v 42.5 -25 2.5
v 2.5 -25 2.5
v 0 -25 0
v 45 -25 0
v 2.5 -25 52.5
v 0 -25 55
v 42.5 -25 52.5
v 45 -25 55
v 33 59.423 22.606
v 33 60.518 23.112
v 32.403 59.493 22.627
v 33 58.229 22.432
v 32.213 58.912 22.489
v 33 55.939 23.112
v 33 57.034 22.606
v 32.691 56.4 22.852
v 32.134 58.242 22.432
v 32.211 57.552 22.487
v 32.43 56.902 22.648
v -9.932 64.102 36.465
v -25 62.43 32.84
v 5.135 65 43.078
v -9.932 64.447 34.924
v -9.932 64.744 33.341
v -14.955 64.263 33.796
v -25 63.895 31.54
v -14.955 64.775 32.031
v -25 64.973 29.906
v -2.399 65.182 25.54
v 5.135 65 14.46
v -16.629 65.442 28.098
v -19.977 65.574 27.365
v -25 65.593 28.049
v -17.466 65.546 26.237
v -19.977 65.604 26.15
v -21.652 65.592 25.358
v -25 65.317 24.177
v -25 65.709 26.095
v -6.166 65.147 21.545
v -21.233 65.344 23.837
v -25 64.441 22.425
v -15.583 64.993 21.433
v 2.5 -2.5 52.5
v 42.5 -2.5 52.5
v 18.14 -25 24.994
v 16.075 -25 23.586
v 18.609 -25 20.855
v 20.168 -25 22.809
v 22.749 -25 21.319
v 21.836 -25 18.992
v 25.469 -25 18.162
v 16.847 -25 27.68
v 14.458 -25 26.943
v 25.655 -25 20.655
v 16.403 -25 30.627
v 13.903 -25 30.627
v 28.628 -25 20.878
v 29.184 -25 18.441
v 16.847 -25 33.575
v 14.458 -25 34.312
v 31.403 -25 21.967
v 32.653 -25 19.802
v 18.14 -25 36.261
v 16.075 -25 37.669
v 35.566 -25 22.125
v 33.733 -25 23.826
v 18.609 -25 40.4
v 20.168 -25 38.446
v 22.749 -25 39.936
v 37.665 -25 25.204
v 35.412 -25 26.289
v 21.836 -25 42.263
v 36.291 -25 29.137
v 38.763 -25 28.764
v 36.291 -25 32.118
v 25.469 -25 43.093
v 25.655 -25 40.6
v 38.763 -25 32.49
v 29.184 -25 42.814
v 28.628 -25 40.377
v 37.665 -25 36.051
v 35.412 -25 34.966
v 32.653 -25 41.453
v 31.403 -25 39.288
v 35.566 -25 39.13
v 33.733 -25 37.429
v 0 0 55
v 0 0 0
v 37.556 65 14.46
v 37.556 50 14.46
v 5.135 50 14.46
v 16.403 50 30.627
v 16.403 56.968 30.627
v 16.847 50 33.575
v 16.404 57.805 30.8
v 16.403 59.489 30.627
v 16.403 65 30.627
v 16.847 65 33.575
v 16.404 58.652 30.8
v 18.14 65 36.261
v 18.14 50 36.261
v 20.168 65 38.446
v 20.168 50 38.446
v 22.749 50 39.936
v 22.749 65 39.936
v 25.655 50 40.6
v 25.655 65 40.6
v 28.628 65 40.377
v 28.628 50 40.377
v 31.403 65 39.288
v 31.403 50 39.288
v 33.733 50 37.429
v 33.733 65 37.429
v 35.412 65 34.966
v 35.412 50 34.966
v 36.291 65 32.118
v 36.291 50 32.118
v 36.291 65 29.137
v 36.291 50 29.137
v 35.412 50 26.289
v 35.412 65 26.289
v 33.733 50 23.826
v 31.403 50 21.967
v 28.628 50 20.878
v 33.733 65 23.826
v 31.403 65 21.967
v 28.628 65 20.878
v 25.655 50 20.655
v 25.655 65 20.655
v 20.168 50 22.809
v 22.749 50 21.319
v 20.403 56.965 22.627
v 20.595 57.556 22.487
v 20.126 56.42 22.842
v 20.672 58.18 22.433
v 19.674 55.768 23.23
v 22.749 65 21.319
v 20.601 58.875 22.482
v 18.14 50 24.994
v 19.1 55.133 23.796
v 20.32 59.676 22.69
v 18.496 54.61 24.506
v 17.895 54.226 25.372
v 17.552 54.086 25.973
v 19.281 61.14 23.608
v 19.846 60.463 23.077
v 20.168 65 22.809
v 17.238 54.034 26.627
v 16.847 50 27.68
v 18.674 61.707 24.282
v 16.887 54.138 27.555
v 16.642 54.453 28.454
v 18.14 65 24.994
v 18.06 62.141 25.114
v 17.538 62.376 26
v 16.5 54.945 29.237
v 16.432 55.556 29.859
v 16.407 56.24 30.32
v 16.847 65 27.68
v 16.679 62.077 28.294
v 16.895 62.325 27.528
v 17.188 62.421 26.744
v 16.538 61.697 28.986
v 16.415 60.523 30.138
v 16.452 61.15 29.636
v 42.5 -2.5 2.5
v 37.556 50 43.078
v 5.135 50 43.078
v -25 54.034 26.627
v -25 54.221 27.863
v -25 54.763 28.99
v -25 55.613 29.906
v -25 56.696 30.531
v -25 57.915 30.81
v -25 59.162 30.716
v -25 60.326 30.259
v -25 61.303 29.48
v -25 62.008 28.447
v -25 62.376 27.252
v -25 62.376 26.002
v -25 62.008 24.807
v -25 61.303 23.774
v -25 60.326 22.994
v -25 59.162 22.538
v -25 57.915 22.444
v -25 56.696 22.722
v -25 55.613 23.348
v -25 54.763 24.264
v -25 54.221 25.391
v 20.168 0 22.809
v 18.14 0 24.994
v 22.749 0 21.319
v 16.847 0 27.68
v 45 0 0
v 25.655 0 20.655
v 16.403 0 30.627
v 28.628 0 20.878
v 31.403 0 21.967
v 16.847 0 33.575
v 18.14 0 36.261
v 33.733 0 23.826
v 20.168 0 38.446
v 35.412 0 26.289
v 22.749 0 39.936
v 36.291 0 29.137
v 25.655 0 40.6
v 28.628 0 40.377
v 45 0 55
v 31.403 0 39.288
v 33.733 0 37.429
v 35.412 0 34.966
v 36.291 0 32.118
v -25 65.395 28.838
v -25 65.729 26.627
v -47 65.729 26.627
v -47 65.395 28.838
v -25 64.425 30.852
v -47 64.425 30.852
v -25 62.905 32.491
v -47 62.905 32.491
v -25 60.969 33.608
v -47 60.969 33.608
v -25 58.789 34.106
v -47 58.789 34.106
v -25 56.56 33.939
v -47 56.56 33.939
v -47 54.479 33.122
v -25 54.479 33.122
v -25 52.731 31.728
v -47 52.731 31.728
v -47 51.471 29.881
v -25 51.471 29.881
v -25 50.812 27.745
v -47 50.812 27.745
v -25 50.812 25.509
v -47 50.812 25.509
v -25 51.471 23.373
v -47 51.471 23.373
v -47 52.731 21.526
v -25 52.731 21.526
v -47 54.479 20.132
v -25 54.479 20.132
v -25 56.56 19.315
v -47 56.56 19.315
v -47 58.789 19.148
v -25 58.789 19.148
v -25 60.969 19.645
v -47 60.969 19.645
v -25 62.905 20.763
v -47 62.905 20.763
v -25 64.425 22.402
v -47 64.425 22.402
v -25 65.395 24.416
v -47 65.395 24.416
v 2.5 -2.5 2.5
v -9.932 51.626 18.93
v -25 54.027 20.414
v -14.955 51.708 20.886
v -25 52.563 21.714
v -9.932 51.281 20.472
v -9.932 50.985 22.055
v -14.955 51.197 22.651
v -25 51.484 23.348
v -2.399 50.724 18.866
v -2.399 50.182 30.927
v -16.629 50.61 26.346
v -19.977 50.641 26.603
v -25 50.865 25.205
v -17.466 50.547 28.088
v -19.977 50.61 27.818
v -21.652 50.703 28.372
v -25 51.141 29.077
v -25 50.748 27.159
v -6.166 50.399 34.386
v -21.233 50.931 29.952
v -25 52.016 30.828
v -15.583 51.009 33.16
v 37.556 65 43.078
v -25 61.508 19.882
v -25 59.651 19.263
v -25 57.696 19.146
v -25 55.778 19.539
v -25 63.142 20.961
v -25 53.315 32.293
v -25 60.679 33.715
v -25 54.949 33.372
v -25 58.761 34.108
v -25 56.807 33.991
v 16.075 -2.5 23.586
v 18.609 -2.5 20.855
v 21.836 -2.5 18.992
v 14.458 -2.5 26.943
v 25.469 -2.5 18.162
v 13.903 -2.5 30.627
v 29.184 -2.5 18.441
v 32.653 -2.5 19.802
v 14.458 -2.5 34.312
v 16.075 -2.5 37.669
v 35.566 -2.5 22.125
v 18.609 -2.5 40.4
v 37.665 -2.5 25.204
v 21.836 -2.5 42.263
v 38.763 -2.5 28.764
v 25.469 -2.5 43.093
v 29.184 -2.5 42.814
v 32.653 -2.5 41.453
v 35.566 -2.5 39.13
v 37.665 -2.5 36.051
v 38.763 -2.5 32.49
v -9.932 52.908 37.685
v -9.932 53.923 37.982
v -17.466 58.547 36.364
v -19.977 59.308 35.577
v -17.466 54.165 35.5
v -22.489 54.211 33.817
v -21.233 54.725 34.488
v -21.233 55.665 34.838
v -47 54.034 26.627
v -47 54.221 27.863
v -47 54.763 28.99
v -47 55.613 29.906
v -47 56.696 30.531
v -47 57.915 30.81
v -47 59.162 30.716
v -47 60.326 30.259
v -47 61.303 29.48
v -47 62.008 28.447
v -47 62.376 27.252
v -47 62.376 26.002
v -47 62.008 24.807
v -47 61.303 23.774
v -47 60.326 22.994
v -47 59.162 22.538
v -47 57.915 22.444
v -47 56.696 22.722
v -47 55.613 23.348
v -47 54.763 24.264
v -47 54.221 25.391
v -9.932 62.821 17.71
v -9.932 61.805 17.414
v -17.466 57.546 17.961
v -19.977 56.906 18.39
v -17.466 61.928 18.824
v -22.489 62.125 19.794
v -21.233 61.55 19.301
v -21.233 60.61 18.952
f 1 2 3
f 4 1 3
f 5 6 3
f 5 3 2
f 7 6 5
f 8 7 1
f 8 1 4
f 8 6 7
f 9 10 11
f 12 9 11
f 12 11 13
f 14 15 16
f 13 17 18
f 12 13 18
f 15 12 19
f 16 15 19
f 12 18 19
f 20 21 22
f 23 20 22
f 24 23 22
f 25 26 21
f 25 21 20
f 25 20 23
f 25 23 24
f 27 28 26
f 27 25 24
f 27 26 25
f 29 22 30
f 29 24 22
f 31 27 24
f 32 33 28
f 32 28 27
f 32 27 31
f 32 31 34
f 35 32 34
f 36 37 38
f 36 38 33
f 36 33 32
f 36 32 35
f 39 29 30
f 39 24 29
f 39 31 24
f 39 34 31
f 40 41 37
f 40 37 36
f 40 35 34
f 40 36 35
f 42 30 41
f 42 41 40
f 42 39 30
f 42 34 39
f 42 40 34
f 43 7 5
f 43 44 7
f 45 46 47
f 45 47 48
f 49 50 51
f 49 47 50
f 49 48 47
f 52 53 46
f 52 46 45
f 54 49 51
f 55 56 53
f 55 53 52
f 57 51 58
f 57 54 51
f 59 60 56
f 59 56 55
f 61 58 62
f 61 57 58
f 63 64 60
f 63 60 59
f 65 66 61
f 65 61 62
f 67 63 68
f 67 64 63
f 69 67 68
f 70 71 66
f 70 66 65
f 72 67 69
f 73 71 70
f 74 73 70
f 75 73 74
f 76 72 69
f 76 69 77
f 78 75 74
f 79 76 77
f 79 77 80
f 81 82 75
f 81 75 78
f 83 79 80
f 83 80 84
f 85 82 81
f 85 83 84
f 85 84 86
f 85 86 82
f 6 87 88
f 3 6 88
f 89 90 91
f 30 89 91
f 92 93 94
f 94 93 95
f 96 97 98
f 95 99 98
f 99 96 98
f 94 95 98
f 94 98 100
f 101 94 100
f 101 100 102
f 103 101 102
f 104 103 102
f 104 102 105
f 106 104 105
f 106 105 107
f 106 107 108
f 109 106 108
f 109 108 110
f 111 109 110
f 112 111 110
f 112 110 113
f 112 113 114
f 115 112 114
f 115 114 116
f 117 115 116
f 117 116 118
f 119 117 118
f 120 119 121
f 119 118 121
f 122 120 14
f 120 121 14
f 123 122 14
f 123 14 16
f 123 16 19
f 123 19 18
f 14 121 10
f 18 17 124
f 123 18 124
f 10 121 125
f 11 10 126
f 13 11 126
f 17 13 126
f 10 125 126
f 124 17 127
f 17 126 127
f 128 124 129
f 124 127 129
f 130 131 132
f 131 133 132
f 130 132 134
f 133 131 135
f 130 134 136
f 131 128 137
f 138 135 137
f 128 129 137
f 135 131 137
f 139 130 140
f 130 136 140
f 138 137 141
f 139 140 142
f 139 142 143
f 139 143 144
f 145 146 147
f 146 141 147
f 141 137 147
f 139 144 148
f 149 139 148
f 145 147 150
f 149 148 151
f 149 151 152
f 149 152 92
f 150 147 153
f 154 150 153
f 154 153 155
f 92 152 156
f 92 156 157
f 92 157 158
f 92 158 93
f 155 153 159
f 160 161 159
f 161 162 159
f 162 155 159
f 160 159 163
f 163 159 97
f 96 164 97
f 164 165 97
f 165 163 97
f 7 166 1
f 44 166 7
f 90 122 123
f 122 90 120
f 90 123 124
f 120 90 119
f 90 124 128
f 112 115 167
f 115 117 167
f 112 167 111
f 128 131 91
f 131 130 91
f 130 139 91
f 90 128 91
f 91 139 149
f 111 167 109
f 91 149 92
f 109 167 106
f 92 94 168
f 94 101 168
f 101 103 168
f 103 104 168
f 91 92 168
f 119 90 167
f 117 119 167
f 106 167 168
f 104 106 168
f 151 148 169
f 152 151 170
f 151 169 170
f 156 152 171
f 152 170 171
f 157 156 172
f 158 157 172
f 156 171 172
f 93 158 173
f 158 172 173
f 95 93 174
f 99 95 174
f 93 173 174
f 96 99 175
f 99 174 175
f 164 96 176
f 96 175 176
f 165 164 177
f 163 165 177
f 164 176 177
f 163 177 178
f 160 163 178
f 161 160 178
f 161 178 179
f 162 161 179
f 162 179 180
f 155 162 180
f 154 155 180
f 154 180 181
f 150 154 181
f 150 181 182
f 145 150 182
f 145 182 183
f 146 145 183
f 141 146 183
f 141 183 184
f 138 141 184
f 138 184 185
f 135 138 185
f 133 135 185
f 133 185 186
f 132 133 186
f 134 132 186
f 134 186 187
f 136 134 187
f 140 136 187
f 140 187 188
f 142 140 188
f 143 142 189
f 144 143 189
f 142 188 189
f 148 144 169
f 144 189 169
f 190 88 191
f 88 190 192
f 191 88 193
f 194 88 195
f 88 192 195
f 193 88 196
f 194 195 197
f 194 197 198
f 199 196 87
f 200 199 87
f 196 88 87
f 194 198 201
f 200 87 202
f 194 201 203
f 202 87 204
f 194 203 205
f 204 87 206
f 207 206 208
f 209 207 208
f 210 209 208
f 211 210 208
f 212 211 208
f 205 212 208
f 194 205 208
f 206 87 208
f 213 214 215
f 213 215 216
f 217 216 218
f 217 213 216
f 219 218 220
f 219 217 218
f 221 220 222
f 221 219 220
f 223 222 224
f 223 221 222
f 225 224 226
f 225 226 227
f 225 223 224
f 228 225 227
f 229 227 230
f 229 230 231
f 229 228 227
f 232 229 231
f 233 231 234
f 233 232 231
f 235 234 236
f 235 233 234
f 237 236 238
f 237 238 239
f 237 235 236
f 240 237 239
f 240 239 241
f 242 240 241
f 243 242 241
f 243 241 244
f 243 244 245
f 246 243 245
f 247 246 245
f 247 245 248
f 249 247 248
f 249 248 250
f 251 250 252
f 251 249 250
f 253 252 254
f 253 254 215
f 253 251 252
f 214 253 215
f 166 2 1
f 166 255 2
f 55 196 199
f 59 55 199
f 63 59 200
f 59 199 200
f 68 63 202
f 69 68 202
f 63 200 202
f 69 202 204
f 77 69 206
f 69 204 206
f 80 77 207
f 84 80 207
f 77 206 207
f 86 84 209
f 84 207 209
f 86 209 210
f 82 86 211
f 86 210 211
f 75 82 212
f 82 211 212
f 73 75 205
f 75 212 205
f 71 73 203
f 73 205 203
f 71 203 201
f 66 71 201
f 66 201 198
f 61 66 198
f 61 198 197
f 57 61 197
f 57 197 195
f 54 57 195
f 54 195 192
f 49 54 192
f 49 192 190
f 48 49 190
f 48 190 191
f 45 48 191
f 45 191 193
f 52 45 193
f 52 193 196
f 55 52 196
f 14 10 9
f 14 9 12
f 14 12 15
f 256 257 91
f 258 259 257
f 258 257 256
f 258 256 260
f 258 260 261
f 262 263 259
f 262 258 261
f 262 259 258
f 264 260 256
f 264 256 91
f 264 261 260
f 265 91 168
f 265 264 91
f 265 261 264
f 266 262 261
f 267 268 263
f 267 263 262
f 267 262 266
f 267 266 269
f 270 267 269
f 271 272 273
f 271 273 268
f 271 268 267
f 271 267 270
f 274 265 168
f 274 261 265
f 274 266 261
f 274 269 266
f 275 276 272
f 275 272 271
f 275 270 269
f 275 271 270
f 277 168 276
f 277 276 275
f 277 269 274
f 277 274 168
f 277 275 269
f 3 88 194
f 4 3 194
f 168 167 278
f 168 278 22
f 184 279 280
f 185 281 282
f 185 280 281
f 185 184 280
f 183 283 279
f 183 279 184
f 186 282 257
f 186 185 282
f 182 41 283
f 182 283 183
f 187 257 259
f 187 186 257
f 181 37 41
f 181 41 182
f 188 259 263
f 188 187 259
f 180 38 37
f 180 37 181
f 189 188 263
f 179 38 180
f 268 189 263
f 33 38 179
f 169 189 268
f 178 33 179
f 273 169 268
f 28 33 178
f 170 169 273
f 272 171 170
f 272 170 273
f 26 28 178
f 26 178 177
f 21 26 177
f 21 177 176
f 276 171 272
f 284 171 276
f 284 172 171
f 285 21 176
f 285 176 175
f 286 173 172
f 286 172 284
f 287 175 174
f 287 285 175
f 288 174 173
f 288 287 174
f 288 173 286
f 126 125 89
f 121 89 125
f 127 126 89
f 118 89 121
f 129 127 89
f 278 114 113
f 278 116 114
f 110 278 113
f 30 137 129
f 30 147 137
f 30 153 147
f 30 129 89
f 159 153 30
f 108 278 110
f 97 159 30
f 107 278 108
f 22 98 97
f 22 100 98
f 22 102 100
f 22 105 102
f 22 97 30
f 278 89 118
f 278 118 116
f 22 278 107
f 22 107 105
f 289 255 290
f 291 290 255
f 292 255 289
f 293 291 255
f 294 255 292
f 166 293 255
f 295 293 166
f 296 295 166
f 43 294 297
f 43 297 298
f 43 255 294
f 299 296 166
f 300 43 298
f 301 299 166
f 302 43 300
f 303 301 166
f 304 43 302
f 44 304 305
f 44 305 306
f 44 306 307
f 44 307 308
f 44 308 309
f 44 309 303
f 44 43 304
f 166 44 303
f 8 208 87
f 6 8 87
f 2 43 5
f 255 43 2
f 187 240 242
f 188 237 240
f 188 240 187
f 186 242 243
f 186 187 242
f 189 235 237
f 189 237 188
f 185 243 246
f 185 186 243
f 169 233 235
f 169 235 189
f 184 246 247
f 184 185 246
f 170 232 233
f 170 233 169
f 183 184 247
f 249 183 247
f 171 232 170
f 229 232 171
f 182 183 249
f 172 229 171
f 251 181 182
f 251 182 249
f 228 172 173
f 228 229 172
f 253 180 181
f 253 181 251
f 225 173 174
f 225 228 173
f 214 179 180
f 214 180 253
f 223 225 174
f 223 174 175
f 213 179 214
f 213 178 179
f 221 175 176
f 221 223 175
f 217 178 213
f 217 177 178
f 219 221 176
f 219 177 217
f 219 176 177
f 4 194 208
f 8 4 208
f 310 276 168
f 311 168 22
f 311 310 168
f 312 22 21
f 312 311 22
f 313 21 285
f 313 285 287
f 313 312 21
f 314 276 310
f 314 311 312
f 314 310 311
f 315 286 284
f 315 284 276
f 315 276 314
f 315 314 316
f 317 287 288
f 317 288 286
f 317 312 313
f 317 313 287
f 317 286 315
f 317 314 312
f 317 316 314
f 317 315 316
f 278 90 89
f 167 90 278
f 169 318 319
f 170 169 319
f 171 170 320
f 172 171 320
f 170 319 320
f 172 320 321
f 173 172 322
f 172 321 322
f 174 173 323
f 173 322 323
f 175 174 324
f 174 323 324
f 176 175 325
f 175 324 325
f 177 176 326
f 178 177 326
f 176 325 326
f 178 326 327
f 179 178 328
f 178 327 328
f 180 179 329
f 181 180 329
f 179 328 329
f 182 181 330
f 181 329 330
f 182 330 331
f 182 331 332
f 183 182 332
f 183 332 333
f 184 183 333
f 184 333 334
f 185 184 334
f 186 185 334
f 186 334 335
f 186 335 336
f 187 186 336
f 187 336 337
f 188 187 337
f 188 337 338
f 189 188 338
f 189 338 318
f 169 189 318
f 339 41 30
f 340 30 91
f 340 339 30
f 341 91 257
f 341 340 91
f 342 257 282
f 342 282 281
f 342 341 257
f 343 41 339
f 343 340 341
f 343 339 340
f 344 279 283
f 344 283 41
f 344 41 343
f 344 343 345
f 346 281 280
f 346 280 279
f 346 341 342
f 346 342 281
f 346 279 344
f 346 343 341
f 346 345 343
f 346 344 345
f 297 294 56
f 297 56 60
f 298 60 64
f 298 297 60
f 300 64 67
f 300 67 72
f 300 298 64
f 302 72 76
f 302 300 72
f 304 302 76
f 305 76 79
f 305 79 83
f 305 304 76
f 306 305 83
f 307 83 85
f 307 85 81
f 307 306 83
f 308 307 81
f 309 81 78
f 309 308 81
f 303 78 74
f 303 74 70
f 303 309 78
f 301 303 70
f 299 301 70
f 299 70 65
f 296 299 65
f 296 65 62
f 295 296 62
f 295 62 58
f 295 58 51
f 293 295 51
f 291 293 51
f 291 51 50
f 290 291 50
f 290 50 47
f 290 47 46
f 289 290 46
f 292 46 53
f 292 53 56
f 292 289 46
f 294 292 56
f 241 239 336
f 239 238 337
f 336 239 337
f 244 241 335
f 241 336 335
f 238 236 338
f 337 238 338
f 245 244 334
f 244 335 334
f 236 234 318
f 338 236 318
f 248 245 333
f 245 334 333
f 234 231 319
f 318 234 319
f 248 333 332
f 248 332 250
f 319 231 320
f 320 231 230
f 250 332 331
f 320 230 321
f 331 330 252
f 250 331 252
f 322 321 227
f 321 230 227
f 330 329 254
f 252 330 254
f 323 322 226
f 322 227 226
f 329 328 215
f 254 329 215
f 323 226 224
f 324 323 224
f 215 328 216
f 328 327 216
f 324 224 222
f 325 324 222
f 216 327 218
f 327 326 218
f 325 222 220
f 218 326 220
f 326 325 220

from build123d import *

# Parameters (mm, degrees)
F1_DEPTH  = 25
F4_W      = 32.4209956452
F4_H      = 28.6179427058
F5_DEPTH  = 15
F8_R      = 7.5
F9_DEPTH  = 22
F5_FACE_W = 15
F5_FACE_H = 28.6179427058
F12_R     = 5.1897115041
F13_DEPTH = 25
F14_R     = 10
F15_DEPTH = 200
F16_R     = 4.1944634135
F17_DEPTH = 80
F18_T     = -2.5


# Not quite as in the source:
# - the arcs of a loft's sections are written as splines that run evenly, so that the points pair up as in the source's solid
# - a feature names something its author has since deleted; it is built from what else it names
# - the program builds the solid bodies; features that only make, move or delete a surface that nothing else refers to are left out


with BuildPart() as f1:
    # F0 (on Front) → F1 (new body)
    with BuildSketch(Plane.XZ):
        Polygon((0, 55), (0, 0), (45, 0), (45, 55), (31.3274413347, 55), (12.6162180677, 55), align=None)
    extrude(amount=F1_DEPTH)

    # F12 (on face) → F13 (cut)
    with BuildSketch(Plane(origin=(44.024232716, 6.5541899568, 0), x_dir=(-0.1472539216, 0.9890987224, 0), z_dir=(0.9890987224, 0.1472539216, 0))):
        with Locations((18.0149693042, 30.8930817991)):
            Circle(F12_R)
    extrude(amount=-F13_DEPTH, mode=Mode.SUBTRACT)


with BuildPart() as f5:
    # F4 (on offset) → F5 (new body)
    with BuildSketch(Plane(origin=(0, 50, 0), x_dir=(-1, 0, 0), z_dir=(0, 1, 0))):
        with Locations((-21.3456586935, 28.7686688825)):
            Rectangle(F4_W, F4_H)
    extrude(amount=F5_DEPTH)

    # F5_face (on face) → F10 section 0
    with BuildSketch(Plane(origin=(5.1351608709, 57.5, 28.7686688825), x_dir=(0, -1, 0), z_dir=(-1, 0, 0))):
        Rectangle(F5_FACE_W, F5_FACE_H)
    # F9_face (on face) → F10 section 1
    with BuildSketch(Plane(origin=(-25, 58.2286454737, 26.6268867999), x_dir=(0, 1, 0), z_dir=(1, 0, 0))):
        with BuildLine():
            add(Edge.make_bspline(
                [(-4.2015845208, -6.2126232394), (-3.3883540404, -6.7626093671), (-2.4660875327, -7.1506811449), (-0.5424923825, -7.5445033349), (0.4580794074, -7.5500987948), (2.385958823, -7.177815061), (3.3125079103, -6.800082345), (4.9511694264, -5.7183695112), (5.6626371118, -5.0148150011), (6.2126232394, -4.2015845208)],
                knots=[0, 0, 0, 0, 0.25, 0.25, 0.5, 0.5, 0.75, 0.75, 1, 1, 1, 1], degree=3))
            add(Edge.make_bspline(
                [(6.2126232394, -4.2015845208), (6.7626093671, -3.3883540404), (7.1506811449, -2.4660875327), (7.5445033349, -0.5424923825), (7.5500987948, 0.4580794074), (7.177815061, 2.385958823), (6.800082345, 3.3125079103), (5.7183695112, 4.9511694264), (5.0148150011, 5.6626371118), (4.2015845208, 6.2126232394)],
                knots=[0, 0, 0, 0, 0.25, 0.25, 0.5, 0.5, 0.75, 0.75, 1, 1, 1, 1], degree=3))
            add(Edge.make_bspline(
                [(4.2015845208, 6.2126232394), (3.3883540404, 6.7626093671), (2.4660875327, 7.1506811449), (0.5424923825, 7.5445033349), (-0.4580794074, 7.5500987948), (-2.385958823, 7.177815061), (-3.3125079103, 6.800082345), (-4.9511694264, 5.7183695112), (-5.6626371118, 5.0148150011), (-6.2126232394, 4.2015845208)],
                knots=[0, 0, 0, 0, 0.25, 0.25, 0.5, 0.5, 0.75, 0.75, 1, 1, 1, 1], degree=3))
            add(Edge.make_bspline(
                [(-6.2126232394, 4.2015845208), (-6.7626093671, 3.3883540404), (-7.1506811449, 2.4660875327), (-7.5445033349, 0.5424923825), (-7.5500987948, -0.4580794074), (-7.177815061, -2.385958823), (-6.800082345, -3.3125079103), (-5.7183695112, -4.9511694264), (-5.0148150011, -5.6626371118), (-4.2015845208, -6.2126232394)],
                knots=[0, 0, 0, 0, 0.25, 0.25, 0.5, 0.5, 0.75, 0.75, 1, 1, 1, 1], degree=3))
        make_face()
    loft(ruled=True)


with BuildPart() as f9:
    # F8 (on offset) → F9 (new body)
    with BuildSketch(Plane.YZ.offset(-25)):
        with Locations((58.2286454737, 26.6268867999)):
            Circle(F8_R)
    extrude(amount=-F9_DEPTH)


with BuildPart() as f15_tool:
    # F14 (on face) → F15 (new body)
    with BuildSketch(Plane(origin=(0, 65, 0), x_dir=(-1, 0, 0), z_dir=(0, 1, 0))):
        with Locations((-26.4027472585, 30.6274686009)):
            Circle(F14_R)
    extrude(amount=-F15_DEPTH)


with BuildPart() as f1_1:
    add(f1.part)

    # F15: cut by f15_tool
    add(f15_tool.part, mode=Mode.SUBTRACT)

    # F18
    f18_openings = [f1_1.faces().sort_by_distance(p)[0] for p in [
        (0.710634, -25, 27.5),
    ]]
    offset(amount=F18_T, openings=f18_openings)


with BuildPart() as f5_1:
    add(f5.part)

    # F15: cut by f15_tool
    add(f15_tool.part, mode=Mode.SUBTRACT)


with BuildPart() as f17_tool:
    # F16 (on face) → F17 (new body)
    with BuildSketch(Plane(origin=(-47, 0, 0), x_dir=(0, -1, 0), z_dir=(-1, 0, 0))):
        with Locations((-58.2286454737, 26.6268867999)):
            Circle(F16_R)
    extrude(amount=-F17_DEPTH)


with BuildPart() as f5_2:
    add(f5_1.part)

    # F17: cut by f17_tool
    add(f17_tool.part, mode=Mode.SUBTRACT)


with BuildPart() as f9_1:
    add(f9.part)

    # F17: cut by f17_tool
    add(f17_tool.part, mode=Mode.SUBTRACT)


solid = Compound([f1_1.part, f5_2.part, f9_1.part])
